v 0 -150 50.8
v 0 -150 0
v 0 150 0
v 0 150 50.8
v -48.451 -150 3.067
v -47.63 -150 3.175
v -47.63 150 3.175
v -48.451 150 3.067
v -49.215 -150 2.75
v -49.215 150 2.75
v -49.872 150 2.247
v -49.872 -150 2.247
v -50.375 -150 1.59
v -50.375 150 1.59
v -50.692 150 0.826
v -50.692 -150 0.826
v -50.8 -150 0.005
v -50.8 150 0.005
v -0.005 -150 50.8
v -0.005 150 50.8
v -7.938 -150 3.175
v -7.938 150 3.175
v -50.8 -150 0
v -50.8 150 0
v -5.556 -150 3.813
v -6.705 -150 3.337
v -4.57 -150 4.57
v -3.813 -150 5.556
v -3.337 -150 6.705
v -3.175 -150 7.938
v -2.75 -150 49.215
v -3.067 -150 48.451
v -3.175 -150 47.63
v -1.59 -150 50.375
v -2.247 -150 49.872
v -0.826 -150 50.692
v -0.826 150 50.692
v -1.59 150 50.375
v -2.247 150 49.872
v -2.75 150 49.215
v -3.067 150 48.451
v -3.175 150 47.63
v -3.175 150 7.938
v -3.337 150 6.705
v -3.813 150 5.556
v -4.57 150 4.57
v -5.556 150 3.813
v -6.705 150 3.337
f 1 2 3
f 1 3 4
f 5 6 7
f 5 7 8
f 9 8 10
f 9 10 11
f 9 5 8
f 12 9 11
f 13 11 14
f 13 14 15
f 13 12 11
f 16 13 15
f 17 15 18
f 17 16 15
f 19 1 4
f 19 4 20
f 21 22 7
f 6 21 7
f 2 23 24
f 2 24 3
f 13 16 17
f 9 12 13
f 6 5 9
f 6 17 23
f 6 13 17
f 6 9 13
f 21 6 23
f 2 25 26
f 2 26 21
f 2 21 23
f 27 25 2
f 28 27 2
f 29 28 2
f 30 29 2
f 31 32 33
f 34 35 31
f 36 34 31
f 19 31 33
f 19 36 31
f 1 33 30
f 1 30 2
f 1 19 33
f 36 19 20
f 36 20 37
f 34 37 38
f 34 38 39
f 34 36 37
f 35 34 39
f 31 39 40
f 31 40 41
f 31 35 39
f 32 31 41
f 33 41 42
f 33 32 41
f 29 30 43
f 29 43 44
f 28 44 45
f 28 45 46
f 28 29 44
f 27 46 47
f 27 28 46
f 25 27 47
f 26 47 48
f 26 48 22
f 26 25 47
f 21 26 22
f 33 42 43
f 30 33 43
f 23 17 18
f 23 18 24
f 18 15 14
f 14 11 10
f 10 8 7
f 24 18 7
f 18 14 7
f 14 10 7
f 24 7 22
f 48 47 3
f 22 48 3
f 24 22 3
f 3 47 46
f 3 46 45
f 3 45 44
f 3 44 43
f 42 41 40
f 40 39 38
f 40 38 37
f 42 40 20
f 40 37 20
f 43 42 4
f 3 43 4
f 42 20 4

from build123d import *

# Parameters (mm, degrees)
HIERRO_ANGULAR_2_X_2_X_0_125_1_DEPTH = 300


with BuildPart() as part:
    # Sketch11 → Hierro angular 2 X 2 X 0.125(1) (new body)
    with BuildSketch(Plane(origin=(0, -150, 0), x_dir=(-1, 0, 0), z_dir=(0, 1, 0))):
        with BuildLine():
            Line((0, 0), (0, 50.8))
            Line((0, 50.8), (0.00508, 50.8))
            ThreePointArc((0.00508, 50.8), (2.246551928, 49.871551928), (3.175, 47.63008))
            Line((3.175, 47.63008), (3.175, 7.9375))
            ThreePointArc((3.175, 7.9375), (4.569903955, 4.569903955), (7.9375, 3.175))
            Line((7.9375, 3.175), (47.63008, 3.175))
            ThreePointArc((47.63008, 3.175), (49.871551928, 2.246551928), (50.8, 0.00508))
            Line((50.8, 0.00508), (50.8, 0))
            Line((50.8, 0), (0, 0))
        make_face()
    extrude(amount=HIERRO_ANGULAR_2_X_2_X_0_125_1_DEPTH)


solid = part.part
